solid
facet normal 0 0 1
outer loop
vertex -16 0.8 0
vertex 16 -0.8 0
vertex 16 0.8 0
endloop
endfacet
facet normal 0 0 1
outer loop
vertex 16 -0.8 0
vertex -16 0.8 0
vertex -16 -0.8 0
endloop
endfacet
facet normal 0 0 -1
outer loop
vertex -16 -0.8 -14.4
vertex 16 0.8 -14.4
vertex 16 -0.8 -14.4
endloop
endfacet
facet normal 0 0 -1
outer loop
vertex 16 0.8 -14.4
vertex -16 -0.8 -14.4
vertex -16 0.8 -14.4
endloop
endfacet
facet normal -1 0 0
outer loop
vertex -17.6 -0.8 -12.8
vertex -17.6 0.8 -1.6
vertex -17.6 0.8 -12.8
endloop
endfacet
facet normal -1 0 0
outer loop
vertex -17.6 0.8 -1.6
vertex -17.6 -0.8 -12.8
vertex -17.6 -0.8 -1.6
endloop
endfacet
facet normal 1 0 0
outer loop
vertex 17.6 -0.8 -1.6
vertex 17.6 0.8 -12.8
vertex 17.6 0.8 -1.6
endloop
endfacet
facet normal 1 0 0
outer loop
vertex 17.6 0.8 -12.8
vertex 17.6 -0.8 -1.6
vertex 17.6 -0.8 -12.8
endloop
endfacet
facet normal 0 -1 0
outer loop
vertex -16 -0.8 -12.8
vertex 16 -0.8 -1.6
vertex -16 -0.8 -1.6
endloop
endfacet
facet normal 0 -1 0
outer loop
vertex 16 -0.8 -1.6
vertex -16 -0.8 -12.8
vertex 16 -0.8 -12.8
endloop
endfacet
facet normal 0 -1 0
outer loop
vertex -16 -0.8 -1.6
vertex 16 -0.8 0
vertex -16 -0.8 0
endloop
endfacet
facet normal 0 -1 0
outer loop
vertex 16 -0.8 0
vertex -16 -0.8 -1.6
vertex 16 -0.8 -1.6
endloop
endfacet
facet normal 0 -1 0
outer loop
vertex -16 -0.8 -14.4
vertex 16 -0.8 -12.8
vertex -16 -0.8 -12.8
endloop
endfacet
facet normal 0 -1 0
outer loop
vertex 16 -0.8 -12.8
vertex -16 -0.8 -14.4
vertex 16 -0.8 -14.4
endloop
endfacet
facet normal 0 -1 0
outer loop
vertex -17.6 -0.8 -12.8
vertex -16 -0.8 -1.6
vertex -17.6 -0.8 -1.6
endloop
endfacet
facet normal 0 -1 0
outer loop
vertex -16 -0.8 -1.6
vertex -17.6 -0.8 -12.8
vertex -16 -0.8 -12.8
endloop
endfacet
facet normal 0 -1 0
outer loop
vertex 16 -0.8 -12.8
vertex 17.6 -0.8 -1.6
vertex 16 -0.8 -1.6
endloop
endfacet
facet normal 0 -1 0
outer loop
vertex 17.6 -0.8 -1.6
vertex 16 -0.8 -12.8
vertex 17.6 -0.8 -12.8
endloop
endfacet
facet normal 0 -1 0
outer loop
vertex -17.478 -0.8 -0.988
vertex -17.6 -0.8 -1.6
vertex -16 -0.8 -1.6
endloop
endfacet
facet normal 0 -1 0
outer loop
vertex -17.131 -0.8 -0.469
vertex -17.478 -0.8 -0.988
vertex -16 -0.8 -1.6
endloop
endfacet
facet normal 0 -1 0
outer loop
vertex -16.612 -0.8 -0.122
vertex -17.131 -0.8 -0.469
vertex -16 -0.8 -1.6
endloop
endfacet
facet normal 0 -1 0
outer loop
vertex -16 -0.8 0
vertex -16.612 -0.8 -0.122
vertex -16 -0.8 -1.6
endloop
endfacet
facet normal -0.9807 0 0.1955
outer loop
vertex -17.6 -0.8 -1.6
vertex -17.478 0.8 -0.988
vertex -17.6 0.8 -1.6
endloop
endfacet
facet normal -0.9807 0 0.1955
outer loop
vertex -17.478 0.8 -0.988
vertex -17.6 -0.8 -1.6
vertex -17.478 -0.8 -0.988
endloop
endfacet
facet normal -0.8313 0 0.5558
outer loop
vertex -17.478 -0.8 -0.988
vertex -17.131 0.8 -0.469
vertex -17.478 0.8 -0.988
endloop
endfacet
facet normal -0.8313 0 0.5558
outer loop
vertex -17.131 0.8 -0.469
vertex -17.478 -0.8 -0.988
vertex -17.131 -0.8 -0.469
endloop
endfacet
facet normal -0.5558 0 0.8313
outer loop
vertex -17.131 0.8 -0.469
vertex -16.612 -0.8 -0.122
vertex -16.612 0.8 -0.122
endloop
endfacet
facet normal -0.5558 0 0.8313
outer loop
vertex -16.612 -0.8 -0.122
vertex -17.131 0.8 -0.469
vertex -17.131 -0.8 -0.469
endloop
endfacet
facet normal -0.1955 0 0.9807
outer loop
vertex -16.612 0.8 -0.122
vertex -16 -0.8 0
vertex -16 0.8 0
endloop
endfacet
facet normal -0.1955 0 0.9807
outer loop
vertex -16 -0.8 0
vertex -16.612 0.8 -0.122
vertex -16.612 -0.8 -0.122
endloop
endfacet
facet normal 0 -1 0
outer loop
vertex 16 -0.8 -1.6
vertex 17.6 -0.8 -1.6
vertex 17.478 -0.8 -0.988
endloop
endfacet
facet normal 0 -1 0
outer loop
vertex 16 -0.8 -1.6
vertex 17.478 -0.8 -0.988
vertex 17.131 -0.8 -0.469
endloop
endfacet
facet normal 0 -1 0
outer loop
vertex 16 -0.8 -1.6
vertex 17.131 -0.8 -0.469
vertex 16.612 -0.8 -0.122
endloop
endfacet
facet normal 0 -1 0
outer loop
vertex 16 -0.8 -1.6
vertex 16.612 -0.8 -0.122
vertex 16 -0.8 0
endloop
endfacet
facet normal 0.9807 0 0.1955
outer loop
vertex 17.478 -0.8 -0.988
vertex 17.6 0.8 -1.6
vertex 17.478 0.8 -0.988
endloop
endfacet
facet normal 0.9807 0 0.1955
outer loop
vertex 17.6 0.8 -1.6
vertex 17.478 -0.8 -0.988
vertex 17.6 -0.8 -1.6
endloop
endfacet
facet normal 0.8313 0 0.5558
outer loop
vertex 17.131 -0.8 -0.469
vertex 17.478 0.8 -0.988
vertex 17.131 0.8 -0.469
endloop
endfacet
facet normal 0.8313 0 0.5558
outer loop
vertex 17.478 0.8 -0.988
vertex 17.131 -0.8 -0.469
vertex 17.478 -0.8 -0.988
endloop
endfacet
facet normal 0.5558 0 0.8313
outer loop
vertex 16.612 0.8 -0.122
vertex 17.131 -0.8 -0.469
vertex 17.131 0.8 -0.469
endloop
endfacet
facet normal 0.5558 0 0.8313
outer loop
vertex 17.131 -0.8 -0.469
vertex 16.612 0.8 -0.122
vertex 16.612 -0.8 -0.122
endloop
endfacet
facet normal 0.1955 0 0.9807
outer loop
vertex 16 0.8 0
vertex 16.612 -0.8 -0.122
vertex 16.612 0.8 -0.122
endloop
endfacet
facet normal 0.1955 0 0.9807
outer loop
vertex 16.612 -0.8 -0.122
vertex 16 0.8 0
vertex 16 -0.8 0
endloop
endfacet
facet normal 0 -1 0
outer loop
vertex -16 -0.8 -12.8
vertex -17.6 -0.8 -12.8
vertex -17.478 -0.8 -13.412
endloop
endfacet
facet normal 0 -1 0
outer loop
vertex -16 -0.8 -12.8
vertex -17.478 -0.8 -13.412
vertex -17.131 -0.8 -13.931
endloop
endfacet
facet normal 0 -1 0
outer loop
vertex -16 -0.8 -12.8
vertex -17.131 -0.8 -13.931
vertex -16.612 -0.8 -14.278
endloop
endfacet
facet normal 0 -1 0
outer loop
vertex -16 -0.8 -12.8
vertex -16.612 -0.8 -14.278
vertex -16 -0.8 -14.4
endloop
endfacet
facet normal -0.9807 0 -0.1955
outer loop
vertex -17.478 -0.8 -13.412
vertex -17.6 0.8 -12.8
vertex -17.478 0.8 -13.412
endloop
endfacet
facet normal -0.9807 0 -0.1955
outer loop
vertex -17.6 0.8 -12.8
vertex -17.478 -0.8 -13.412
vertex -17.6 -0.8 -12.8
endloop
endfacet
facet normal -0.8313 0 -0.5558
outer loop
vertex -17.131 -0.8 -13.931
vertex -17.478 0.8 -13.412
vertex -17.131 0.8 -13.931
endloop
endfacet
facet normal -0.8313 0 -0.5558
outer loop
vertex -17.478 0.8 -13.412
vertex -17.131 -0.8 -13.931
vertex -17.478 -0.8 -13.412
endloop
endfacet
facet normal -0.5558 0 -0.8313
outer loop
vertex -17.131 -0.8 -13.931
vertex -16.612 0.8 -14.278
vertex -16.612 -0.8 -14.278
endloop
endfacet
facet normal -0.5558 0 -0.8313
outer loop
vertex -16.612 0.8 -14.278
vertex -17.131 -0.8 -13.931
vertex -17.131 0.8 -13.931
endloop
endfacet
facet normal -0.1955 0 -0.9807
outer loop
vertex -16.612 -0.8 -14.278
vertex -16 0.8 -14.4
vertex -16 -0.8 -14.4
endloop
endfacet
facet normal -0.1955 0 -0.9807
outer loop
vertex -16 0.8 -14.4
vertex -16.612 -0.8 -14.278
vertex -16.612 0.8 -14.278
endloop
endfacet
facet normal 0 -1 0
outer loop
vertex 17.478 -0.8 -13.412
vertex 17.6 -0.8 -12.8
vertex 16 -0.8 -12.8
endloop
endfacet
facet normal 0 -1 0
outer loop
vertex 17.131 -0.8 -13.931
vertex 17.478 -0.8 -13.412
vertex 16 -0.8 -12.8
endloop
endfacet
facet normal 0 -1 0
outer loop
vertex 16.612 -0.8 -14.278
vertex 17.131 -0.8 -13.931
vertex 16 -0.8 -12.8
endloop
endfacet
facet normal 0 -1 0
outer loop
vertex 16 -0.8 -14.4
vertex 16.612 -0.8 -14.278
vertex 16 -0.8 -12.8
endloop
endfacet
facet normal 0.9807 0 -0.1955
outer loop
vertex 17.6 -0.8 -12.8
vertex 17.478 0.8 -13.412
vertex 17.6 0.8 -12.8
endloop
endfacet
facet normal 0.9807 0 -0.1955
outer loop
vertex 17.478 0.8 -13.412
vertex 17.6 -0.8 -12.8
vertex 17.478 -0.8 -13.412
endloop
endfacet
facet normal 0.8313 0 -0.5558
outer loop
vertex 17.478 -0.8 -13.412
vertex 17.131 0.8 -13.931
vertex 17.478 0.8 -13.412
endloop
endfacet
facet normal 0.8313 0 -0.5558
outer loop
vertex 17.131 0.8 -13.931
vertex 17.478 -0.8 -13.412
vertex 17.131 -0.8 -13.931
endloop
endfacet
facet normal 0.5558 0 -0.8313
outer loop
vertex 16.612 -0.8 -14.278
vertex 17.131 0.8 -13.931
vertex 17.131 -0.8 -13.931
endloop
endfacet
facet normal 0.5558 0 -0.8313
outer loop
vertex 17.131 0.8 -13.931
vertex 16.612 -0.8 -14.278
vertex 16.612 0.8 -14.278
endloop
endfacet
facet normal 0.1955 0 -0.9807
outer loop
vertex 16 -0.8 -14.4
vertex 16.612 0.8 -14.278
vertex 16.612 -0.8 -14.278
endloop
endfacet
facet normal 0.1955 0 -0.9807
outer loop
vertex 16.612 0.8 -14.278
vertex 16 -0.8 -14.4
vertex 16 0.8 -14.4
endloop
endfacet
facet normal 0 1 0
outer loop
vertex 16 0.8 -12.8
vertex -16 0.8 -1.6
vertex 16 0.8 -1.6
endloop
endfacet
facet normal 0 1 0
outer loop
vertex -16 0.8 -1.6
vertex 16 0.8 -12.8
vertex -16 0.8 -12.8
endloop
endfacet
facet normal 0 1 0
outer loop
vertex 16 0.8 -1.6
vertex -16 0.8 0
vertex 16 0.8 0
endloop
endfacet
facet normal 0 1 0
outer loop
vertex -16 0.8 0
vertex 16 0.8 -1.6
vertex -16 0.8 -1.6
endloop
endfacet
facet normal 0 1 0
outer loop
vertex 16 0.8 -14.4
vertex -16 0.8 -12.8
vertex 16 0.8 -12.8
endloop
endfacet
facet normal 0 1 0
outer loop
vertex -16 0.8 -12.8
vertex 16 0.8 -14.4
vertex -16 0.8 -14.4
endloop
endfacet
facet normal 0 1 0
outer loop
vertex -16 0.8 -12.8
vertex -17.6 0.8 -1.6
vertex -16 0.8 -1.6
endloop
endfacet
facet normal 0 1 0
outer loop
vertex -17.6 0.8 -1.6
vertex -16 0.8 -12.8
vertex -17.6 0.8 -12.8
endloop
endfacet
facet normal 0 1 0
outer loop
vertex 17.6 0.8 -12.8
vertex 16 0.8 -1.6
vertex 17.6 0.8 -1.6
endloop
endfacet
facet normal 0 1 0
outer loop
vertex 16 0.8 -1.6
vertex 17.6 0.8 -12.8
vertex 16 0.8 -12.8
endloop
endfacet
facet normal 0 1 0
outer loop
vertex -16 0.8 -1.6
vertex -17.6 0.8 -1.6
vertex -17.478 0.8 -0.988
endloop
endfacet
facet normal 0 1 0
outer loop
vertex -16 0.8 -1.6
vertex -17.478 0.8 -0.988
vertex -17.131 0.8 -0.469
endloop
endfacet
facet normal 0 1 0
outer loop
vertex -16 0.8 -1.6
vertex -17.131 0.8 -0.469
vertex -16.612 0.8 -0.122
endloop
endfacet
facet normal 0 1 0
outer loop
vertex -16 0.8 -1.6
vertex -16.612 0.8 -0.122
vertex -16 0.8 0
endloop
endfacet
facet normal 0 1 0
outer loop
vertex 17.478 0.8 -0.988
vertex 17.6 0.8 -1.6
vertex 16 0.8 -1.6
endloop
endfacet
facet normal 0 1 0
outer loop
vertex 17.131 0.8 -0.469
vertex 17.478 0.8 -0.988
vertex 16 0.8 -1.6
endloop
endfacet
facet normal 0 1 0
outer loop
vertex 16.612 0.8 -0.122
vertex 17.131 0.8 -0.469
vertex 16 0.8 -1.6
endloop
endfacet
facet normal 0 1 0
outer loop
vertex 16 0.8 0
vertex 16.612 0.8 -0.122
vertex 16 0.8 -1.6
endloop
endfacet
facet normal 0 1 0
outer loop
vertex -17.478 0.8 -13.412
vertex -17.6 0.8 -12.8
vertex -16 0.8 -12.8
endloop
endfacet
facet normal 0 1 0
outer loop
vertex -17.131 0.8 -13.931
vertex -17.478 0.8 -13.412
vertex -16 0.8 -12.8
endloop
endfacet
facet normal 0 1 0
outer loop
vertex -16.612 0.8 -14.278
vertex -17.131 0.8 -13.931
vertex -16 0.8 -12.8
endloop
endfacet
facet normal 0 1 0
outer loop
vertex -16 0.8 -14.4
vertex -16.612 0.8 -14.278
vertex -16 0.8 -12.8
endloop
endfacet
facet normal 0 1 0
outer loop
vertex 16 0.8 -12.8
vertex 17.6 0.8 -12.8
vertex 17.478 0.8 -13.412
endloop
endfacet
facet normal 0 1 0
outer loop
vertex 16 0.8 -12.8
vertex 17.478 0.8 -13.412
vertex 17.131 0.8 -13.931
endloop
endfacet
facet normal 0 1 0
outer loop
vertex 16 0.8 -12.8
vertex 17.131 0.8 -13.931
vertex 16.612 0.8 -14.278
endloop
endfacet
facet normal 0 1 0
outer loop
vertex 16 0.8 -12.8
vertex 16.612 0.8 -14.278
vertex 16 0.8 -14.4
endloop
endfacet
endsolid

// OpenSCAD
// file: ../p/1-4edge.scad
use <../lib.scad>
function ldraw_lib__1_4edge() = [
// 0 Circle 0.25
// 0 Name: 1-4edge.dat
// 0 Author: James Jessiman
// 0 !LDRAW_ORG Primitive UPDATE 2017-01
// 0 !LICENSE Licensed under CC BY 4.0 : see CAreadme.txt
// 
// 0 BFC CERTIFY CCW
  [0,"BFC","CERTIFY"],
  [0,"BFC","CCW"],
// 
// 0 !HISTORY 2007-06-22 [PTadmin] Header formatted for Contributor Agreement
// 0 !HISTORY 2008-07-01 [PTadmin] Official Update 2008-01
// 0 !HISTORY 2017-01-15 [Steffen] BFCed
// 0 !HISTORY 2017-12-30 [PTadmin] Official Update 2017-01
// 
// 
// 2 24 1 0 0 0.9239 0 0.3827
  [2,24,1,0,0,0.9239,0,0.3827],
// 2 24 0.9239 0 0.3827 0.7071 0 0.7071
  [2,24,0.9239,0,0.3827,0.7071,0,0.7071],
// 2 24 0.7071 0 0.7071 0.3827 0 0.9239
  [2,24,0.7071,0,0.7071,0.3827,0,0.9239],
// 2 24 0.3827 0 0.9239 0 0 1
  [2,24,0.3827,0,0.9239,0,0,1],
];
module ldraw_lib__1_4edge(step=0, col=false, unit=2/5, alt=false, line=0.2, solid=!$preview)
    makepoly(ldraw_lib__1_4edge(), step=step, col=col, unit=unit, alt=alt, line=line, solid=solid);
ldraw_lib__1_4edge(line=0.2);
// file: ../p/1-4cyli.scad
use <../lib.scad>
function ldraw_lib__1_4cyli() = [
// 0 Cylinder 0.25
// 0 Name: 1-4cyli.dat
// 0 Author: James Jessiman
// 0 !LDRAW_ORG Primitive UPDATE 2012-01
// 0 !LICENSE Licensed under CC BY 4.0 : see CAreadme.txt
// 
// 0 BFC CERTIFY CCW
  [0,"BFC","CERTIFY"],
  [0,"BFC","CCW"],
// 
// 0 !HISTORY 2002-03-23 [sbliss] Added BFC statement.
// 0 !HISTORY 2002-04-25 [PTadmin] Official Update 2002-02
// 0 !HISTORY 2007-06-22 [PTadmin] Header formatted for Contributor Agreement
// 0 !HISTORY 2008-07-01 [PTadmin] Official Update 2008-01
// 0 !HISTORY 2012-02-16 [Philo] Changed to CCW
// 0 !HISTORY 2012-03-30 [PTadmin] Official Update 2012-01
// 
// 
// 4 16 1 1 0 0.9239 1 0.3827 0.9239 0 0.3827 1 0 0
  [4,16,1,1,0,0.9239,1,0.3827,0.9239,0,0.3827,1,0,0],
// 5 24 1 0 0 1 1 0 0.9239 0 0.3827 1 0 -1
  [5,24,1,0,0,1,1,0,0.9239,0,0.3827,1,0,-1],
// 4 16 0.9239 1 0.3827 0.7071 1 0.7071 0.7071 0 0.7071 0.9239 0 0.3827
  [4,16,0.9239,1,0.3827,0.7071,1,0.7071,0.7071,0,0.7071,0.9239,0,0.3827],
// 5 24 0.9239 0 0.3827 0.9239 1 0.3827 0.7071 0 0.7071 1 0 0
  [5,24,0.9239,0,0.3827,0.9239,1,0.3827,0.7071,0,0.7071,1,0,0],
// 4 16 0.7071 1 0.7071 0.3827 1 0.9239 0.3827 0 0.9239 0.7071 0 0.7071
  [4,16,0.7071,1,0.7071,0.3827,1,0.9239,0.3827,0,0.9239,0.7071,0,0.7071],
// 5 24 0.7071 0 0.7071 0.7071 1 0.7071 0.3827 0 0.9239 0.9239 0 0.3827
  [5,24,0.7071,0,0.7071,0.7071,1,0.7071,0.3827,0,0.9239,0.9239,0,0.3827],
// 4 16 0.3827 1 0.9239 0 1 1 0 0 1 0.3827 0 0.9239
  [4,16,0.3827,1,0.9239,0,1,1,0,0,1,0.3827,0,0.9239],
// 5 24 0.3827 0 0.9239 0.3827 1 0.9239 0 0 1 0.7071 0 0.7071
  [5,24,0.3827,0,0.9239,0.3827,1,0.9239,0,0,1,0.7071,0,0.7071],
// 5 24 0 0 1 0 1 1 0.3827 0 0.9239 -1 0 1
  [5,24,0,0,1,0,1,1,0.3827,0,0.9239,-1,0,1],
];
module ldraw_lib__1_4cyli(step=0, col=false, unit=2/5, alt=false, line=0.2, solid=!$preview)
    makepoly(ldraw_lib__1_4cyli(), step=step, col=col, unit=unit, alt=alt, line=line, solid=solid);
ldraw_lib__1_4cyli(line=0.2);
// file: ../p/rect2p.scad
use <../lib.scad>
function ldraw_lib__rect2p() = [
// 0 Rectangle with 2 Parallel Edges
// 0 Name: rect2p.dat
// 0 Author: Donald Sutter [technog]
// 0 !LDRAW_ORG Primitive UPDATE 2010-01
// 0 !LICENSE Licensed under CC BY 4.0 : see CAreadme.txt
// 
// 0 BFC CERTIFY CCW
  [0,"BFC","CERTIFY"],
  [0,"BFC","CCW"],
// 
// 0 !HISTORY 2003-08-01 [PTadmin] Official Update 2003-02
// 0 !HISTORY 2007-06-24 [PTadmin] Header formatted for Contributor Agreement
// 0 !HISTORY 2008-07-01 [PTadmin] Official Update 2008-01
// 0 !HISTORY 2010-01-17 [mikeheide] changed winding to CCW
// 0 !HISTORY 2010-04-05 [PTadmin] Official Update 2010-01
// 
// 
// 2 24 1 0 1 -1 0 1
  [2,24,1,0,1,-1,0,1],
// 2 24 -1 0 -1 1 0 -1
  [2,24,-1,0,-1,1,0,-1],
// 4 16 -1 0 1 -1 0 -1 1 0 -1 1 0 1
  [4,16,-1,0,1,-1,0,-1,1,0,-1,1,0,1],
// 0
];
module ldraw_lib__rect2p(step=0, col=false, unit=2/5, alt=false, line=0.2, solid=!$preview)
    makepoly(ldraw_lib__rect2p(), step=step, col=col, unit=unit, alt=alt, line=line, solid=solid);
ldraw_lib__rect2p(line=0.2);
// file: ../p/1-4disc.scad
use <../lib.scad>
function ldraw_lib__1_4disc() = [
// 0 Disc 0.25
// 0 Name: 1-4disc.dat
// 0 Author: James Jessiman
// 0 !LDRAW_ORG Primitive UPDATE 2002-02
// 0 !LICENSE Licensed under CC BY 4.0 : see CAreadme.txt
// 
// 0 BFC CERTIFY CCW
  [0,"BFC","CERTIFY"],
  [0,"BFC","CCW"],
// 
// 0 !HISTORY 2002-03-23 [sbliss] Added BFC statement.
// 0 !HISTORY 2002-04-25 [PTadmin] Official Update 2002-02
// 0 !HISTORY 2007-06-22 [PTadmin] Header formatted for Contributor Agreement
// 0 !HISTORY 2008-07-01 [PTadmin] Official Update 2008-01
// 
// 
// 3 16 0 0 0 1 0 0 0.9239 0 0.3827
  [3,16,0,0,0,1,0,0,0.9239,0,0.3827],
// 3 16 0 0 0 0.9239 0 0.3827 0.7071 0 0.7071
  [3,16,0,0,0,0.9239,0,0.3827,0.7071,0,0.7071],
// 3 16 0 0 0 0.7071 0 0.7071 0.3827 0 0.9239
  [3,16,0,0,0,0.7071,0,0.7071,0.3827,0,0.9239],
// 3 16 0 0 0 0.3827 0 0.9239 0 0 1
  [3,16,0,0,0,0.3827,0,0.9239,0,0,1],
// 0
];
module ldraw_lib__1_4disc(step=0, col=false, unit=2/5, alt=false, line=0.2, solid=!$preview)
    makepoly(ldraw_lib__1_4disc(), step=step, col=col, unit=unit, alt=alt, line=line, solid=solid);
ldraw_lib__1_4disc(line=0.2);
// file: ../p/1-4cylc.scad
use <../lib.scad>
use <1-4cyli.scad>
use <1-4disc.scad>
use <1-4edge.scad>
function ldraw_lib__1_4cylc() = [
// 0 Cylinder Closed 0.25
// 0 Name: 1-4cylc.dat
// 0 Author: Mark Kennedy [mkennedy]
// 0 !LDRAW_ORG Primitive UPDATE 2010-01
// 0 !LICENSE Licensed under CC BY 4.0 : see CAreadme.txt
// 
// 0 BFC CERTIFY CCW
  [0,"BFC","CERTIFY"],
  [0,"BFC","CCW"],
// 
// 0 !HISTORY 2010-04-05 [PTadmin] Official Update 2010-01
// 
// 
// 1 16 0 0 0 1 0 0 0 1 0 0 0 1 1-4edge.dat
  [1,16,0,0,0,1,0,0,0,1,0,0,0,1, ldraw_lib__1_4edge()],
// 1 16 0 1 0 1 0 0 0 1 0 0 0 1 1-4edge.dat
  [1,16,0,1,0,1,0,0,0,1,0,0,0,1, ldraw_lib__1_4edge()],
// 1 16 0 0 0 1 0 0 0 1 0 0 0 1 1-4disc.dat
  [1,16,0,0,0,1,0,0,0,1,0,0,0,1, ldraw_lib__1_4disc()],
// 1 16 0 0 0 1 0 0 0 1 0 0 0 1 1-4cyli.dat
  [1,16,0,0,0,1,0,0,0,1,0,0,0,1, ldraw_lib__1_4cyli()],
// 0
];
module ldraw_lib__1_4cylc(step=0, col=false, unit=2/5, alt=false, line=0.2, solid=!$preview)
    makepoly(ldraw_lib__1_4cylc(), step=step, col=col, unit=unit, alt=alt, line=line, solid=solid);
ldraw_lib__1_4cylc(line=0.2);
// main file
use <../lib.scad>
use <../p/1-4cylc.scad>
use <../p/1-4disc.scad>
use <../p/rect2p.scad>
function ldraw_lib__30321() = [
// 0 Glass for Panel  3 x  6 x  6 with Window
// 0 Name: 30321.dat
// 0 Author: Tony Hafner [hafhead]
// 0 !LDRAW_ORG Part UPDATE 2025-09
// 0 !LICENSE Licensed under CC BY 4.0 : see CAreadme.txt
// 
// 0 BFC CERTIFY CCW
  [0,"BFC","CERTIFY"],
  [0,"BFC","CCW"],
// 
// 0 !KEYWORDS BrickLink x207, Rebrickable 354
// 
// 0 !HISTORY 2003-08-01 [PTadmin] Official Update 2003-02
// 0 !HISTORY 2007-06-25 [PTadmin] Header formatted for Contributor Agreement
// 0 !HISTORY 2008-07-01 [PTadmin] Official Update 2008-01
// 0 !HISTORY 2010-10-18 [Philo] Used more primitives
// 0 !HISTORY 2010-10-18 [PTadmin] Renamed from 354
// 0 !HISTORY 2013-03-22 [mikeheide] shifted origin z=50 and y=-40
// 0 !HISTORY 2013-07-21 [PTadmin] Official Update 2013-01
// 0 !HISTORY 2025-09-27 [OrionP] Changed winding to CCW
// 0 !HISTORY 2025-09-29 [OrionP] Official Update 2025-09
// 
// 1 16 0 0 0 40 0 0 0 1 0 0 0 -2 rect2p.dat
  [1,16,0,0,0,40,0,0,0,1,0,0,0,-2, ldraw_lib__rect2p()],
// 1 16 0 36 0 40 0 0 0 -1 0 0 0 2 rect2p.dat
  [1,16,0,36,0,40,0,0,0,-1,0,0,0,2, ldraw_lib__rect2p()],
// 1 16 -44 18 0 0 1 0 14 0 0 0 0 2 rect2p.dat
  [1,16,-44,18,0,0,1,0,14,0,0,0,0,2, ldraw_lib__rect2p()],
// 1 16 44 18 0 0 -1 0 14 0 0 0 0 -2 rect2p.dat
  [1,16,44,18,0,0,-1,0,14,0,0,0,0,-2, ldraw_lib__rect2p()],
// 4 16 -40 32 -2 40 32 -2 40 4 -2 -40 4 -2
  [4,16,-40,32,-2,40,32,-2,40,4,-2,-40,4,-2],
// 4 16 -40 4 -2 40 4 -2 40 0 -2 -40 0 -2
  [4,16,-40,4,-2,40,4,-2,40,0,-2,-40,0,-2],
// 4 16 -40 36 -2 40 36 -2 40 32 -2 -40 32 -2
  [4,16,-40,36,-2,40,36,-2,40,32,-2,-40,32,-2],
// 4 16 -44 32 -2 -40 32 -2 -40 4 -2 -44 4 -2
  [4,16,-44,32,-2,-40,32,-2,-40,4,-2,-44,4,-2],
// 4 16 40 4 -2 40 32 -2 44 32 -2 44 4 -2
  [4,16,40,4,-2,40,32,-2,44,32,-2,44,4,-2],
// 1 16 -40 4 -2 -4 0 0 0 0 -4 0 4 0 1-4cylc.dat
  [1,16,-40,4,-2,-4,0,0,0,0,-4,0,4,0, ldraw_lib__1_4cylc()],
// 1 16 40 4 -2 4 0 0 0 0 -4 0 4 0 1-4cylc.dat
  [1,16,40,4,-2,4,0,0,0,0,-4,0,4,0, ldraw_lib__1_4cylc()],
// 1 16 -40 32 -2 -4 0 0 0 0 4 0 4 0 1-4cylc.dat
  [1,16,-40,32,-2,-4,0,0,0,0,4,0,4,0, ldraw_lib__1_4cylc()],
// 1 16 40 32 -2 4 0 0 0 0 4 0 4 0 1-4cylc.dat
  [1,16,40,32,-2,4,0,0,0,0,4,0,4,0, ldraw_lib__1_4cylc()],
// 4 16 40 4 2 40 32 2 -40 32 2 -40 4 2
  [4,16,40,4,2,40,32,2,-40,32,2,-40,4,2],
// 4 16 40 0 2 40 4 2 -40 4 2 -40 0 2
  [4,16,40,0,2,40,4,2,-40,4,2,-40,0,2],
// 4 16 40 32 2 40 36 2 -40 36 2 -40 32 2
  [4,16,40,32,2,40,36,2,-40,36,2,-40,32,2],
// 4 16 -40 4 2 -40 32 2 -44 32 2 -44 4 2
  [4,16,-40,4,2,-40,32,2,-44,32,2,-44,4,2],
// 4 16 44 32 2 40 32 2 40 4 2 44 4 2
  [4,16,44,32,2,40,32,2,40,4,2,44,4,2],
// 1 16 -40 4 2 -4 0 0 0 0 -4 0 -1 0 1-4disc.dat
  [1,16,-40,4,2,-4,0,0,0,0,-4,0,-1,0, ldraw_lib__1_4disc()],
// 1 16 40 4 2 4 0 0 0 0 -4 0 -1 0 1-4disc.dat
  [1,16,40,4,2,4,0,0,0,0,-4,0,-1,0, ldraw_lib__1_4disc()],
// 1 16 -40 32 2 -4 0 0 0 0 4 0 -1 0 1-4disc.dat
  [1,16,-40,32,2,-4,0,0,0,0,4,0,-1,0, ldraw_lib__1_4disc()],
// 1 16 40 32 2 4 0 0 0 0 4 0 -1 0 1-4disc.dat
  [1,16,40,32,2,4,0,0,0,0,4,0,-1,0, ldraw_lib__1_4disc()],
];
module ldraw_lib__30321(step=0, col=false, unit=2/5, alt=false, line=0.2, solid=!$preview)
    makepoly(ldraw_lib__30321(), step=step, col=col, unit=unit, alt=alt, line=line, solid=solid);
ldraw_lib__30321(line=0.2);
